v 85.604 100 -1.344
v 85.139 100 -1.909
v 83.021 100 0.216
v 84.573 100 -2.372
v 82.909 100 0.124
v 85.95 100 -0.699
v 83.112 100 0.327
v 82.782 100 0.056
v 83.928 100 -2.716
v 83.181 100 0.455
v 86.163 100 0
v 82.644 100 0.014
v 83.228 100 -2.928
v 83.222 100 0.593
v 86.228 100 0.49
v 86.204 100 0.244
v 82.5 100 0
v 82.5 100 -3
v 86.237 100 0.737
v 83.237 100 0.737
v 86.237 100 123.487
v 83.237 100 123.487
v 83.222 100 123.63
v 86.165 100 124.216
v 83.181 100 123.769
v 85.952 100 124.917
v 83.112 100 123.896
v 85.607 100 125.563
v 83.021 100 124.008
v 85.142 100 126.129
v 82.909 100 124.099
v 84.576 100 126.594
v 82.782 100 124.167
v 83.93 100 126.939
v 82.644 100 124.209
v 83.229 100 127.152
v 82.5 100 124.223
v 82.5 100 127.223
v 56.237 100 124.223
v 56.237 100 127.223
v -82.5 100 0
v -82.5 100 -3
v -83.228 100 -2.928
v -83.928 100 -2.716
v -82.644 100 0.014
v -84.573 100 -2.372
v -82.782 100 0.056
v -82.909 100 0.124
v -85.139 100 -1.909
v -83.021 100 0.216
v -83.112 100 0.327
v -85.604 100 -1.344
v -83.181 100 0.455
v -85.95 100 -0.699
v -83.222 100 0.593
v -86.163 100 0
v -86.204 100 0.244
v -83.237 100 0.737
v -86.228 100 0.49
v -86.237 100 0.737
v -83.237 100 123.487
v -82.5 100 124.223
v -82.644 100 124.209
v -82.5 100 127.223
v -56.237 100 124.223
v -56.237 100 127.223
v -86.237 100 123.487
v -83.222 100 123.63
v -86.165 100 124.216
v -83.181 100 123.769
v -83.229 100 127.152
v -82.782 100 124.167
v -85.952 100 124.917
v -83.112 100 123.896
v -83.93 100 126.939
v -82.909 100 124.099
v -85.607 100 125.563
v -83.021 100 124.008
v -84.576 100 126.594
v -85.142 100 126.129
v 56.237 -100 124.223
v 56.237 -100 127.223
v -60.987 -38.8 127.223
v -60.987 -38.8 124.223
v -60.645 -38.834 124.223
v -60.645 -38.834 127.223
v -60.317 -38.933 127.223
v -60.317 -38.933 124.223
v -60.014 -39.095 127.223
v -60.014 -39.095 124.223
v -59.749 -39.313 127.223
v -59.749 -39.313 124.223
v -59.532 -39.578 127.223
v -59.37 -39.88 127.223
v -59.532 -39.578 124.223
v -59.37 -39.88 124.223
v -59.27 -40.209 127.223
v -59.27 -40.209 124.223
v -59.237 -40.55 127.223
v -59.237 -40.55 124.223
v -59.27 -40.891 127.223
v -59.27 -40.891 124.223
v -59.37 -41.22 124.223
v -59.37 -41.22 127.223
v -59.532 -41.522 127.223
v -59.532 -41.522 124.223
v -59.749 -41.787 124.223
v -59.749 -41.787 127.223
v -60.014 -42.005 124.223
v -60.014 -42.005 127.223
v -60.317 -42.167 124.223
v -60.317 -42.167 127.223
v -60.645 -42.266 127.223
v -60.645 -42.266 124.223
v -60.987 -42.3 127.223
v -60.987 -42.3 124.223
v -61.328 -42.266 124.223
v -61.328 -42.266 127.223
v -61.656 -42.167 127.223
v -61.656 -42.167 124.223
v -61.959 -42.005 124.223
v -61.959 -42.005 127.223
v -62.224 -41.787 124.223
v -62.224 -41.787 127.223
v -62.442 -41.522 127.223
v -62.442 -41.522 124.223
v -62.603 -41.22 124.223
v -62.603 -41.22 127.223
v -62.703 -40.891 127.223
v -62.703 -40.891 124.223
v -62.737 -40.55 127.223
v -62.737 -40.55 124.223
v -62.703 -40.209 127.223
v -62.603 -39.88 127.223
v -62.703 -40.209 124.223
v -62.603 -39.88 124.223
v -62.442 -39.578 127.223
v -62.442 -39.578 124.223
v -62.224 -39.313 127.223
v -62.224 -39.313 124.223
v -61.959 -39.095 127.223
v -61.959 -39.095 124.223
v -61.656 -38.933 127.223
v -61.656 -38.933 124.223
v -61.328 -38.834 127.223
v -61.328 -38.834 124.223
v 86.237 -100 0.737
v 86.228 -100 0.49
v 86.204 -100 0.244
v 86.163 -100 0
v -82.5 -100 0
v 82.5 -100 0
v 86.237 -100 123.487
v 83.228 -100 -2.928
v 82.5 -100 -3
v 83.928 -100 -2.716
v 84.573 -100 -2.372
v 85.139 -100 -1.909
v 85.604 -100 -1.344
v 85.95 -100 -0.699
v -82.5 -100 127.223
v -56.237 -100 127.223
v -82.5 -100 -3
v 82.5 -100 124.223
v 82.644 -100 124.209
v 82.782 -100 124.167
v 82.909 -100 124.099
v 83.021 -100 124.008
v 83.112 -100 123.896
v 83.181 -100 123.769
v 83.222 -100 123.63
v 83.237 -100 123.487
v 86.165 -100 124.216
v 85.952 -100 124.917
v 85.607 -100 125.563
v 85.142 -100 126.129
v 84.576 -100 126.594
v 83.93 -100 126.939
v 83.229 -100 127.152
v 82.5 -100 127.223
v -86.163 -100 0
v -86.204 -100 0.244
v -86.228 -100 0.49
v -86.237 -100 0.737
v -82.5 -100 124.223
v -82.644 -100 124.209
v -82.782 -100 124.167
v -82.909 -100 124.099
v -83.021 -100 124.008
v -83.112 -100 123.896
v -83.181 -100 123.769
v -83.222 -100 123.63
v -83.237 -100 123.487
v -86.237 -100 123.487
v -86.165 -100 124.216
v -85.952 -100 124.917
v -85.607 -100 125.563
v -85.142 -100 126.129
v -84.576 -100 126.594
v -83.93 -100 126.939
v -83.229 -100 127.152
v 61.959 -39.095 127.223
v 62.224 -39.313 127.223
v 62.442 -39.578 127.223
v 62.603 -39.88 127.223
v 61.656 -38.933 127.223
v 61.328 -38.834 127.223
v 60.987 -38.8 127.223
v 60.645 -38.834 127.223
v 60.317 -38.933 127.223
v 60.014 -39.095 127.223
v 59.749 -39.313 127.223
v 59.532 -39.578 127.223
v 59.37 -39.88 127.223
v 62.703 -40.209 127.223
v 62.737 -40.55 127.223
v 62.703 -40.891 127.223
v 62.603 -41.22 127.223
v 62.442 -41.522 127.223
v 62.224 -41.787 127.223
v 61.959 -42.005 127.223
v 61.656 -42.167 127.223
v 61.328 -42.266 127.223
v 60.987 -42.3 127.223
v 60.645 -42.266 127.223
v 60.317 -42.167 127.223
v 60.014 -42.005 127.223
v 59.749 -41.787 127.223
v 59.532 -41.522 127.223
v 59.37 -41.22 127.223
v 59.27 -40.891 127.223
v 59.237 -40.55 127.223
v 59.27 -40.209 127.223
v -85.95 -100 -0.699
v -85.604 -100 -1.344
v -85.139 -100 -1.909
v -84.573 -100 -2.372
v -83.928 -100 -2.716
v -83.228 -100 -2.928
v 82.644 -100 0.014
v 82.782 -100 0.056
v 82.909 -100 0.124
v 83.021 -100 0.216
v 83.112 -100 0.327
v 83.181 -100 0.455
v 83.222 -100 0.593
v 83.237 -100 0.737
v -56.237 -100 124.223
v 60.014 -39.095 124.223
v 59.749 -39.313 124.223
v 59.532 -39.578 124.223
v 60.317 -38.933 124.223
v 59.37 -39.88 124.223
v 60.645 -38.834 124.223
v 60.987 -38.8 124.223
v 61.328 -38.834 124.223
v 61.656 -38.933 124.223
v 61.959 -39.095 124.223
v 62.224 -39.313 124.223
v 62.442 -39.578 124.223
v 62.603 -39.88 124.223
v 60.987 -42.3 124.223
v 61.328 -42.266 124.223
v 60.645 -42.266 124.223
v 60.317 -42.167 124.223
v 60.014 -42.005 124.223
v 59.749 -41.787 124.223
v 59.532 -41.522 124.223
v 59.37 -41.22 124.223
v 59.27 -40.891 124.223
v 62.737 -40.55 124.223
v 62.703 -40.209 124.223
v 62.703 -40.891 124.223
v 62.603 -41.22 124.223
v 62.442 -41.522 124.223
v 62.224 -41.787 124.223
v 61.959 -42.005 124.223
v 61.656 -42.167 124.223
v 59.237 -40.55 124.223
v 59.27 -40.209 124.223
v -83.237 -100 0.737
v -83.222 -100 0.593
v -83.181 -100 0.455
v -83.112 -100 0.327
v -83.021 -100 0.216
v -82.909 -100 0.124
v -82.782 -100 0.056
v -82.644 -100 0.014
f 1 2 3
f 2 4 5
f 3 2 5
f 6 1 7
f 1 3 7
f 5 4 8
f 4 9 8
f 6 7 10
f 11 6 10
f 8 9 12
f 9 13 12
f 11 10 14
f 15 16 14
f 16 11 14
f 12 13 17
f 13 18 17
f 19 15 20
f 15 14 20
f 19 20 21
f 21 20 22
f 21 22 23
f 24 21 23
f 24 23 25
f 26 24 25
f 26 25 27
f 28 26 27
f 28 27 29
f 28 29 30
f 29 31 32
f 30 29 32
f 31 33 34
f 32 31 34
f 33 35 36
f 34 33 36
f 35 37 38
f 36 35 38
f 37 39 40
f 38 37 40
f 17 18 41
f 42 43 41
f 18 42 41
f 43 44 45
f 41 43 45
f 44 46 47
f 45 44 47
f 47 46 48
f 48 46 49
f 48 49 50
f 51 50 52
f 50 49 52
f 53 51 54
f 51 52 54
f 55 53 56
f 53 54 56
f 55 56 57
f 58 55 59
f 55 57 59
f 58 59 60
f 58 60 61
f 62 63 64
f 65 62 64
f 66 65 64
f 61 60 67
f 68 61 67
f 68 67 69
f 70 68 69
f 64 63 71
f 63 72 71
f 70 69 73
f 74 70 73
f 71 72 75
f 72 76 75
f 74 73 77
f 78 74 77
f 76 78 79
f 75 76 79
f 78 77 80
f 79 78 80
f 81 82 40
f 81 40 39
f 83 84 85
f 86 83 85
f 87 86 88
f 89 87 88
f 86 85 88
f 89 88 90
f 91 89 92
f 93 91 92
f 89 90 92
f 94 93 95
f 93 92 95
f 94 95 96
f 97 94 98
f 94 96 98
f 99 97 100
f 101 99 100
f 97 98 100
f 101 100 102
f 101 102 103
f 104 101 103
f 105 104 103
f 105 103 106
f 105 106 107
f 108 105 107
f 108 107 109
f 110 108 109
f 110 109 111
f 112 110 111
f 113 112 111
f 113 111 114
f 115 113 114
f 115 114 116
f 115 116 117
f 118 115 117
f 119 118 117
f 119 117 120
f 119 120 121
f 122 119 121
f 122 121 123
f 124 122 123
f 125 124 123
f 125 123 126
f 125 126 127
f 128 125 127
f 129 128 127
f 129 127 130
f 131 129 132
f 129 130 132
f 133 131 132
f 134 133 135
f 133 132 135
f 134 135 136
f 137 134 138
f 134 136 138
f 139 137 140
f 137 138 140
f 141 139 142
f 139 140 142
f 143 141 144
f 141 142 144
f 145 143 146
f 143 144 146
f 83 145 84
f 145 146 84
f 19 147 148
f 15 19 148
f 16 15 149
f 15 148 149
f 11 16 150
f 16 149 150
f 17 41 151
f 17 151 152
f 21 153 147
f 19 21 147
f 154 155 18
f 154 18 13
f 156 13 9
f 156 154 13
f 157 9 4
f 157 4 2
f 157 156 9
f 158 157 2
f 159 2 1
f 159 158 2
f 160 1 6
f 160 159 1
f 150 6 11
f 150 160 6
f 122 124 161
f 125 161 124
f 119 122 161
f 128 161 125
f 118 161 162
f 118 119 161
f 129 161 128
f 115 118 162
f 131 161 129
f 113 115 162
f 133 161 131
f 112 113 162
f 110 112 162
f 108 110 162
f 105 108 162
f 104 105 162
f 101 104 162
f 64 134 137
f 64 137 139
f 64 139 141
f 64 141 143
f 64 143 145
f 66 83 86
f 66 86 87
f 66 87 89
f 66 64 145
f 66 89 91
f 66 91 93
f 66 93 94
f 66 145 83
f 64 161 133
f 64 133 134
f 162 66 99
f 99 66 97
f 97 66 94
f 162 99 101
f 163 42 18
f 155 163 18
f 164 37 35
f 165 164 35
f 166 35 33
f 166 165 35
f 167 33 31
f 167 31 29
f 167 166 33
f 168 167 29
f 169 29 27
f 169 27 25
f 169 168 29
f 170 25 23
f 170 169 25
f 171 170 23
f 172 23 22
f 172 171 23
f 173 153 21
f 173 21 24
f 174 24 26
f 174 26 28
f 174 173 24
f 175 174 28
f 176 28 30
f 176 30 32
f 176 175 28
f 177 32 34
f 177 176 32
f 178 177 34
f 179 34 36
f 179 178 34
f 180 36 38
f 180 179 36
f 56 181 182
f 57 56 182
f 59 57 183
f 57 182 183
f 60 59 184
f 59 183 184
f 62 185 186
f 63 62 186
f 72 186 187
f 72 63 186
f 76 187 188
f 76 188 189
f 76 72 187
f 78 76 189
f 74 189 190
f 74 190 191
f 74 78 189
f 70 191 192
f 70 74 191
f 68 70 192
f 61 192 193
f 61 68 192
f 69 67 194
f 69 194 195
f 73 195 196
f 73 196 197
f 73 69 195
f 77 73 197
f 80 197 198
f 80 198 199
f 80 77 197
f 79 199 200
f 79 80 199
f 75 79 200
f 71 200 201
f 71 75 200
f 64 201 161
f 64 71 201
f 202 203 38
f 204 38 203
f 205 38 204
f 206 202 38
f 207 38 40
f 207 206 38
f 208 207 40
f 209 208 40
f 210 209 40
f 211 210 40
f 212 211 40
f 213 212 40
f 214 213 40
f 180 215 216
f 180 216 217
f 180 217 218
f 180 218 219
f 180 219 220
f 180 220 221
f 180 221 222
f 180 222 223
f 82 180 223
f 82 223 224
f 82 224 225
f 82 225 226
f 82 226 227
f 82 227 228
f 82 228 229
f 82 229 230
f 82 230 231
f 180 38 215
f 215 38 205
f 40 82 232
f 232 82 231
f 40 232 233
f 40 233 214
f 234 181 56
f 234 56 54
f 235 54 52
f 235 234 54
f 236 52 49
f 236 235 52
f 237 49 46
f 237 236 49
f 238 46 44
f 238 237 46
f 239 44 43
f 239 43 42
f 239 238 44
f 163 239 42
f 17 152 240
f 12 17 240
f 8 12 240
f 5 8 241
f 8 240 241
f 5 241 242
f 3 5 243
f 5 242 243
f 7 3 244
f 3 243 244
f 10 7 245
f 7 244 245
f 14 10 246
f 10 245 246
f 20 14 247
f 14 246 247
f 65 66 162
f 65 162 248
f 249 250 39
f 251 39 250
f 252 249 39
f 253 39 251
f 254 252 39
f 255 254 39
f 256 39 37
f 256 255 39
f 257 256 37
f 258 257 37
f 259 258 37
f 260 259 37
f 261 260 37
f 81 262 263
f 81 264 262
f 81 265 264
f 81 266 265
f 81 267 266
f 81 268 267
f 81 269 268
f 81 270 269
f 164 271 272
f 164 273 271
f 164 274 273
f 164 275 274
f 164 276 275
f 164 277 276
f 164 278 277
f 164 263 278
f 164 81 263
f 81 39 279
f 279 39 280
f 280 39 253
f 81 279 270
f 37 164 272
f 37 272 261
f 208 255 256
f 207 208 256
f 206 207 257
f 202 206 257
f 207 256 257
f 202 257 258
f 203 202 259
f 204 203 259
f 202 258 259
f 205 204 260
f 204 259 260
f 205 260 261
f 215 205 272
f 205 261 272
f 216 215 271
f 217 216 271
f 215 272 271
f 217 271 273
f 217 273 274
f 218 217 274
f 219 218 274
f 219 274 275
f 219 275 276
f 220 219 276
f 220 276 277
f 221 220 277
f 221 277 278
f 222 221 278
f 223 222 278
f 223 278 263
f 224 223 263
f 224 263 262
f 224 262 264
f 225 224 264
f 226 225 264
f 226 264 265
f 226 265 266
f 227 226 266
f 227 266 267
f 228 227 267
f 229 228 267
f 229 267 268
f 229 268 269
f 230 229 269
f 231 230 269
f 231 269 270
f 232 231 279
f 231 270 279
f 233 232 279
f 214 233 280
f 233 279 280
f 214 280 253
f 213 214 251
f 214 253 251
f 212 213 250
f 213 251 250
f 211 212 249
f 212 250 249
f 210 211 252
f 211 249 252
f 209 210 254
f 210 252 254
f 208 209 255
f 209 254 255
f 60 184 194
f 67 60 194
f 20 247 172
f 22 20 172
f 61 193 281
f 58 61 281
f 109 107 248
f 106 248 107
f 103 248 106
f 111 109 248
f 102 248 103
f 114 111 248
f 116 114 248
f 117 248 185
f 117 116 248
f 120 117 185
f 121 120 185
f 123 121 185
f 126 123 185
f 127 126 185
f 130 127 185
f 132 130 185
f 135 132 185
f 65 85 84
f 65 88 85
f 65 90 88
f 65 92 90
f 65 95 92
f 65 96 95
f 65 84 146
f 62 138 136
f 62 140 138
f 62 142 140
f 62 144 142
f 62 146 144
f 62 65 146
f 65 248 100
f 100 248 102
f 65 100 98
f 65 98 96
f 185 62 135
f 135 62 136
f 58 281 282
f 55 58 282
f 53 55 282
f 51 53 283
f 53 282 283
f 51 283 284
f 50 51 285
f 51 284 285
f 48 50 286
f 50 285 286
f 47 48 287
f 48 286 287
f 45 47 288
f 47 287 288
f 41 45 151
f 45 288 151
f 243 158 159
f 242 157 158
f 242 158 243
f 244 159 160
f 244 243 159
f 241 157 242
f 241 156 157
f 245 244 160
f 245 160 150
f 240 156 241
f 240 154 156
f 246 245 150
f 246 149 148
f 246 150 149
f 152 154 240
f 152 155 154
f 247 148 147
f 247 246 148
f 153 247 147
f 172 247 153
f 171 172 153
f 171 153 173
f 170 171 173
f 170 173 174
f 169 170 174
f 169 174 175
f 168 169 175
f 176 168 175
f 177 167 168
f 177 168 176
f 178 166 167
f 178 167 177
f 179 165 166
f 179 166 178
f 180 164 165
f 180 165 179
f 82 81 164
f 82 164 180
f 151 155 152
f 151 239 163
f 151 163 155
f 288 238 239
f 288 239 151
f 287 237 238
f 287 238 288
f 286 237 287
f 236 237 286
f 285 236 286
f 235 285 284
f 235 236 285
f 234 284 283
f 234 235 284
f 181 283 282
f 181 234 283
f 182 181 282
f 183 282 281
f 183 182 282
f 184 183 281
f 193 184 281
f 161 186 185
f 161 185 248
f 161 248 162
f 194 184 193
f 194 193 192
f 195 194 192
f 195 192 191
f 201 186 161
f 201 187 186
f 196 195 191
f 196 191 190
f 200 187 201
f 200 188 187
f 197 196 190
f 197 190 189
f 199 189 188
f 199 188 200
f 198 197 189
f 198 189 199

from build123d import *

# Parameters (mm, degrees)
SKETCH1_W                    = 165
SKETCH1_H                    = 200
BASE_FLANGE1_DEPTH           = 3
SKETCH6_W                    = 130
SKETCH6_H                    = 200
TAB1_DEPTH                   = 3
SKETCHED_START               = -100
SKETCHED_BEND1_DEPTH         = 200
SKETCHED_BEND1_2_DEPTH       = 200
SKETCH10_W                   = 130
SKETCH10_H                   = 200
TAB2_DEPTH                   = 3
SKETCHED_BEND2_DEPTH         = 200
SKETCHED_BEND2_2_DEPTH       = 200
EDGE_FLANGE1_STRIP_W         = 13.4732
EDGE_FLANGE1_STRIP_H         = 3
EDGE_FLANGE1_STRIP_CUT_DEPTH = 200
EDGE_FLANGE1_DEPTH           = 200
EDGE_FLANGE2_STRIP_W         = 13.4732
EDGE_FLANGE2_STRIP_H         = 3
EDGE_FLANGE2_STRIP_CUT_DEPTH = 200
EDGE_FLANGE2_DEPTH           = 200
SKETCH20_R                   = 1.75
CUT_EXTRUDE1_DEPTH           = 10


# Read off the part's stored shape, not the designer's step: Sketched Bend1, Sketched Bend2
# Sheet-metal steps are written as plain solids
with BuildPart() as part:
    # Sketch1 → Base-Flange1 (new body)
    with BuildSketch(Plane.XY):
        Rectangle(SKETCH1_W, SKETCH1_H)
    extrude(amount=-BASE_FLANGE1_DEPTH)

    # Sketch6 → Tab1 (add)
    with BuildSketch(Plane(origin=(0, 0, -3), x_dir=(-1, 0, 0), z_dir=(0, 0, -1))):
        with Locations((-147.5, 0)):
            Rectangle(SKETCH6_W, SKETCH6_H)
    extrude(amount=-TAB1_DEPTH)

    # Sketched Bend1 outline → Sketched Bend1 (cut)
    with BuildSketch(Plane(origin=(0, 0, 0), x_dir=(1, 0, 0), z_dir=(0, 1, 0)).offset(SKETCHED_START)):
        with BuildLine():
            ThreePointArc((82.5, 3), (84.867467001, 2.154295979), (86.163277222, 0))
            Line((86.163277222, 0), (212.5, 0))
            Line((212.5, 0), (212.5, 3))
            Line((212.5, 3), (82.5, 3))
        make_face()
    extrude(amount=SKETCHED_BEND1_DEPTH, mode=Mode.SUBTRACT)

    # Sketched Bend1 2 outline → Sketched Bend1 2 (add)
    with BuildSketch(Plane(origin=(0, 0, 0), x_dir=(1, 0, 0), z_dir=(0, 1, 0)).offset(SKETCHED_START)):
        with BuildLine():
            Line((86.2366, -127.223356935), (86.2366, -0.7366))
            ThreePointArc((86.2366, -0.7366), (86.218224121, -0.36647982), (86.163277222, 0))
            Line((86.163277222, 0), (82.5, 0))
            ThreePointArc((82.5, 0), (83.020854855, -0.215745145), (83.2366, -0.7366))
            Line((83.2366, -0.7366), (83.2366, -127.223356935))
            Line((83.2366, -127.223356935), (86.2366, -127.223356935))
        make_face()
    extrude(amount=SKETCHED_BEND1_2_DEPTH)

    # Sketch10 → Tab2 (add)
    with BuildSketch(Plane.XY):
        with Locations((-147.5, 0)):
            Rectangle(SKETCH10_W, SKETCH10_H)
    extrude(amount=-TAB2_DEPTH)

    # Sketched Bend2 outline → Sketched Bend2 (cut)
    with BuildSketch(Plane(origin=(0, 0, 0), x_dir=(1, 0, 0), z_dir=(0, 1, 0)).offset(SKETCHED_START)):
        with BuildLine():
            Line((-212.5, 0), (-86.163277222, 0))
            ThreePointArc((-86.163277222, 0), (-84.867467001, 2.154295979), (-82.5, 3))
            Line((-82.5, 3), (-212.5, 3))
            Line((-212.5, 3), (-212.5, 0))
        make_face()
    extrude(amount=SKETCHED_BEND2_DEPTH, mode=Mode.SUBTRACT)

    # Sketched Bend2 2 outline → Sketched Bend2 2 (add)
    with BuildSketch(Plane(origin=(0, 0, 0), x_dir=(1, 0, 0), z_dir=(0, 1, 0)).offset(SKETCHED_START)):
        with BuildLine():
            Line((-86.2366, -0.7366), (-86.2366, -127.223356935))
            Line((-86.2366, -127.223356935), (-83.2366, -127.223356935))
            Line((-83.2366, -127.223356935), (-83.2366, -0.7366))
            ThreePointArc((-83.2366, -0.7366), (-83.020854855, -0.215745145), (-82.5, 0))
            Line((-82.5, 0), (-86.163277222, 0))
            ThreePointArc((-86.163277222, 0), (-86.218224121, -0.36647982), (-86.2366, -0.7366))
        make_face()
    extrude(amount=SKETCHED_BEND2_2_DEPTH)

    # Edge-Flange1 strip (across the edge) → Edge-Flange1 strip cut (cut)
    with BuildSketch(Plane(origin=(-83.2366, 100, 127.223356935), x_dir=(0, 0, -1), z_dir=(0, -1, 0))):
        with Locations((-3, -1.5)):
            Rectangle(EDGE_FLANGE1_STRIP_W, EDGE_FLANGE1_STRIP_H)
    extrude(amount=EDGE_FLANGE1_STRIP_CUT_DEPTH, mode=Mode.SUBTRACT)

    # Edge-Flange1 section (across the edge) → Edge-Flange1 (add)
    with BuildSketch(Plane(origin=(-83.2366, 100, 127.223356935), x_dir=(0, 0, -1), z_dir=(0, -1, 0))):
        with BuildLine():
            Line((0, 0.7366), (0, 27))
            Line((0, 27), (3, 27))
            Line((3, 27), (3, 0.7366))
            ThreePointArc((3, 0.7366), (3.215745145, 0.215745145), (3.7366, 0))
            Line((3.7366, 0), (3.7366, -3))
            ThreePointArc((3.7366, -3), (1.094424801, -1.905575199), (0, 0.7366))
        make_face()
    extrude(amount=EDGE_FLANGE1_DEPTH)

    # Edge-Flange2 strip (across the edge) → Edge-Flange2 strip cut (cut)
    with BuildSketch(Plane(origin=(83.2366, -100, 127.223356935), x_dir=(0, 0, -1), z_dir=(0, 1, 0))):
        with Locations((-3, -1.5)):
            Rectangle(EDGE_FLANGE2_STRIP_W, EDGE_FLANGE2_STRIP_H)
    extrude(amount=EDGE_FLANGE2_STRIP_CUT_DEPTH, mode=Mode.SUBTRACT)

    # Edge-Flange2 section (across the edge) → Edge-Flange2 (add)
    with BuildSketch(Plane(origin=(83.2366, -100, 127.223356935), x_dir=(0, 0, -1), z_dir=(0, 1, 0))):
        with BuildLine():
            Line((0, 0.7366), (0, 27))
            Line((0, 27), (3, 27))
            Line((3, 27), (3, 0.7366))
            ThreePointArc((3, 0.7366), (3.215745145, 0.215745145), (3.7366, 0))
            Line((3.7366, 0), (3.7366, -3))
            ThreePointArc((3.7366, -3), (1.094424801, -1.905575199), (0, 0.7366))
        make_face()
    extrude(amount=EDGE_FLANGE2_DEPTH)

    # Sketch20 → Cut-Extrude1 (cut)
    with BuildSketch(Plane(origin=(0, 0, 124.223356935), x_dir=(-1, 0, 0), z_dir=(0, 0, -1))):
        with Locations(Location((-60.9866, -40.55, 0), (0, 0, 90))):
            Circle(SKETCH20_R)
        with Locations(Location((60.9866, -40.55, 0), (0, 0, 90))):
            Circle(SKETCH20_R)
    extrude(amount=-CUT_EXTRUDE1_DEPTH, mode=Mode.SUBTRACT)


solid = part.part
